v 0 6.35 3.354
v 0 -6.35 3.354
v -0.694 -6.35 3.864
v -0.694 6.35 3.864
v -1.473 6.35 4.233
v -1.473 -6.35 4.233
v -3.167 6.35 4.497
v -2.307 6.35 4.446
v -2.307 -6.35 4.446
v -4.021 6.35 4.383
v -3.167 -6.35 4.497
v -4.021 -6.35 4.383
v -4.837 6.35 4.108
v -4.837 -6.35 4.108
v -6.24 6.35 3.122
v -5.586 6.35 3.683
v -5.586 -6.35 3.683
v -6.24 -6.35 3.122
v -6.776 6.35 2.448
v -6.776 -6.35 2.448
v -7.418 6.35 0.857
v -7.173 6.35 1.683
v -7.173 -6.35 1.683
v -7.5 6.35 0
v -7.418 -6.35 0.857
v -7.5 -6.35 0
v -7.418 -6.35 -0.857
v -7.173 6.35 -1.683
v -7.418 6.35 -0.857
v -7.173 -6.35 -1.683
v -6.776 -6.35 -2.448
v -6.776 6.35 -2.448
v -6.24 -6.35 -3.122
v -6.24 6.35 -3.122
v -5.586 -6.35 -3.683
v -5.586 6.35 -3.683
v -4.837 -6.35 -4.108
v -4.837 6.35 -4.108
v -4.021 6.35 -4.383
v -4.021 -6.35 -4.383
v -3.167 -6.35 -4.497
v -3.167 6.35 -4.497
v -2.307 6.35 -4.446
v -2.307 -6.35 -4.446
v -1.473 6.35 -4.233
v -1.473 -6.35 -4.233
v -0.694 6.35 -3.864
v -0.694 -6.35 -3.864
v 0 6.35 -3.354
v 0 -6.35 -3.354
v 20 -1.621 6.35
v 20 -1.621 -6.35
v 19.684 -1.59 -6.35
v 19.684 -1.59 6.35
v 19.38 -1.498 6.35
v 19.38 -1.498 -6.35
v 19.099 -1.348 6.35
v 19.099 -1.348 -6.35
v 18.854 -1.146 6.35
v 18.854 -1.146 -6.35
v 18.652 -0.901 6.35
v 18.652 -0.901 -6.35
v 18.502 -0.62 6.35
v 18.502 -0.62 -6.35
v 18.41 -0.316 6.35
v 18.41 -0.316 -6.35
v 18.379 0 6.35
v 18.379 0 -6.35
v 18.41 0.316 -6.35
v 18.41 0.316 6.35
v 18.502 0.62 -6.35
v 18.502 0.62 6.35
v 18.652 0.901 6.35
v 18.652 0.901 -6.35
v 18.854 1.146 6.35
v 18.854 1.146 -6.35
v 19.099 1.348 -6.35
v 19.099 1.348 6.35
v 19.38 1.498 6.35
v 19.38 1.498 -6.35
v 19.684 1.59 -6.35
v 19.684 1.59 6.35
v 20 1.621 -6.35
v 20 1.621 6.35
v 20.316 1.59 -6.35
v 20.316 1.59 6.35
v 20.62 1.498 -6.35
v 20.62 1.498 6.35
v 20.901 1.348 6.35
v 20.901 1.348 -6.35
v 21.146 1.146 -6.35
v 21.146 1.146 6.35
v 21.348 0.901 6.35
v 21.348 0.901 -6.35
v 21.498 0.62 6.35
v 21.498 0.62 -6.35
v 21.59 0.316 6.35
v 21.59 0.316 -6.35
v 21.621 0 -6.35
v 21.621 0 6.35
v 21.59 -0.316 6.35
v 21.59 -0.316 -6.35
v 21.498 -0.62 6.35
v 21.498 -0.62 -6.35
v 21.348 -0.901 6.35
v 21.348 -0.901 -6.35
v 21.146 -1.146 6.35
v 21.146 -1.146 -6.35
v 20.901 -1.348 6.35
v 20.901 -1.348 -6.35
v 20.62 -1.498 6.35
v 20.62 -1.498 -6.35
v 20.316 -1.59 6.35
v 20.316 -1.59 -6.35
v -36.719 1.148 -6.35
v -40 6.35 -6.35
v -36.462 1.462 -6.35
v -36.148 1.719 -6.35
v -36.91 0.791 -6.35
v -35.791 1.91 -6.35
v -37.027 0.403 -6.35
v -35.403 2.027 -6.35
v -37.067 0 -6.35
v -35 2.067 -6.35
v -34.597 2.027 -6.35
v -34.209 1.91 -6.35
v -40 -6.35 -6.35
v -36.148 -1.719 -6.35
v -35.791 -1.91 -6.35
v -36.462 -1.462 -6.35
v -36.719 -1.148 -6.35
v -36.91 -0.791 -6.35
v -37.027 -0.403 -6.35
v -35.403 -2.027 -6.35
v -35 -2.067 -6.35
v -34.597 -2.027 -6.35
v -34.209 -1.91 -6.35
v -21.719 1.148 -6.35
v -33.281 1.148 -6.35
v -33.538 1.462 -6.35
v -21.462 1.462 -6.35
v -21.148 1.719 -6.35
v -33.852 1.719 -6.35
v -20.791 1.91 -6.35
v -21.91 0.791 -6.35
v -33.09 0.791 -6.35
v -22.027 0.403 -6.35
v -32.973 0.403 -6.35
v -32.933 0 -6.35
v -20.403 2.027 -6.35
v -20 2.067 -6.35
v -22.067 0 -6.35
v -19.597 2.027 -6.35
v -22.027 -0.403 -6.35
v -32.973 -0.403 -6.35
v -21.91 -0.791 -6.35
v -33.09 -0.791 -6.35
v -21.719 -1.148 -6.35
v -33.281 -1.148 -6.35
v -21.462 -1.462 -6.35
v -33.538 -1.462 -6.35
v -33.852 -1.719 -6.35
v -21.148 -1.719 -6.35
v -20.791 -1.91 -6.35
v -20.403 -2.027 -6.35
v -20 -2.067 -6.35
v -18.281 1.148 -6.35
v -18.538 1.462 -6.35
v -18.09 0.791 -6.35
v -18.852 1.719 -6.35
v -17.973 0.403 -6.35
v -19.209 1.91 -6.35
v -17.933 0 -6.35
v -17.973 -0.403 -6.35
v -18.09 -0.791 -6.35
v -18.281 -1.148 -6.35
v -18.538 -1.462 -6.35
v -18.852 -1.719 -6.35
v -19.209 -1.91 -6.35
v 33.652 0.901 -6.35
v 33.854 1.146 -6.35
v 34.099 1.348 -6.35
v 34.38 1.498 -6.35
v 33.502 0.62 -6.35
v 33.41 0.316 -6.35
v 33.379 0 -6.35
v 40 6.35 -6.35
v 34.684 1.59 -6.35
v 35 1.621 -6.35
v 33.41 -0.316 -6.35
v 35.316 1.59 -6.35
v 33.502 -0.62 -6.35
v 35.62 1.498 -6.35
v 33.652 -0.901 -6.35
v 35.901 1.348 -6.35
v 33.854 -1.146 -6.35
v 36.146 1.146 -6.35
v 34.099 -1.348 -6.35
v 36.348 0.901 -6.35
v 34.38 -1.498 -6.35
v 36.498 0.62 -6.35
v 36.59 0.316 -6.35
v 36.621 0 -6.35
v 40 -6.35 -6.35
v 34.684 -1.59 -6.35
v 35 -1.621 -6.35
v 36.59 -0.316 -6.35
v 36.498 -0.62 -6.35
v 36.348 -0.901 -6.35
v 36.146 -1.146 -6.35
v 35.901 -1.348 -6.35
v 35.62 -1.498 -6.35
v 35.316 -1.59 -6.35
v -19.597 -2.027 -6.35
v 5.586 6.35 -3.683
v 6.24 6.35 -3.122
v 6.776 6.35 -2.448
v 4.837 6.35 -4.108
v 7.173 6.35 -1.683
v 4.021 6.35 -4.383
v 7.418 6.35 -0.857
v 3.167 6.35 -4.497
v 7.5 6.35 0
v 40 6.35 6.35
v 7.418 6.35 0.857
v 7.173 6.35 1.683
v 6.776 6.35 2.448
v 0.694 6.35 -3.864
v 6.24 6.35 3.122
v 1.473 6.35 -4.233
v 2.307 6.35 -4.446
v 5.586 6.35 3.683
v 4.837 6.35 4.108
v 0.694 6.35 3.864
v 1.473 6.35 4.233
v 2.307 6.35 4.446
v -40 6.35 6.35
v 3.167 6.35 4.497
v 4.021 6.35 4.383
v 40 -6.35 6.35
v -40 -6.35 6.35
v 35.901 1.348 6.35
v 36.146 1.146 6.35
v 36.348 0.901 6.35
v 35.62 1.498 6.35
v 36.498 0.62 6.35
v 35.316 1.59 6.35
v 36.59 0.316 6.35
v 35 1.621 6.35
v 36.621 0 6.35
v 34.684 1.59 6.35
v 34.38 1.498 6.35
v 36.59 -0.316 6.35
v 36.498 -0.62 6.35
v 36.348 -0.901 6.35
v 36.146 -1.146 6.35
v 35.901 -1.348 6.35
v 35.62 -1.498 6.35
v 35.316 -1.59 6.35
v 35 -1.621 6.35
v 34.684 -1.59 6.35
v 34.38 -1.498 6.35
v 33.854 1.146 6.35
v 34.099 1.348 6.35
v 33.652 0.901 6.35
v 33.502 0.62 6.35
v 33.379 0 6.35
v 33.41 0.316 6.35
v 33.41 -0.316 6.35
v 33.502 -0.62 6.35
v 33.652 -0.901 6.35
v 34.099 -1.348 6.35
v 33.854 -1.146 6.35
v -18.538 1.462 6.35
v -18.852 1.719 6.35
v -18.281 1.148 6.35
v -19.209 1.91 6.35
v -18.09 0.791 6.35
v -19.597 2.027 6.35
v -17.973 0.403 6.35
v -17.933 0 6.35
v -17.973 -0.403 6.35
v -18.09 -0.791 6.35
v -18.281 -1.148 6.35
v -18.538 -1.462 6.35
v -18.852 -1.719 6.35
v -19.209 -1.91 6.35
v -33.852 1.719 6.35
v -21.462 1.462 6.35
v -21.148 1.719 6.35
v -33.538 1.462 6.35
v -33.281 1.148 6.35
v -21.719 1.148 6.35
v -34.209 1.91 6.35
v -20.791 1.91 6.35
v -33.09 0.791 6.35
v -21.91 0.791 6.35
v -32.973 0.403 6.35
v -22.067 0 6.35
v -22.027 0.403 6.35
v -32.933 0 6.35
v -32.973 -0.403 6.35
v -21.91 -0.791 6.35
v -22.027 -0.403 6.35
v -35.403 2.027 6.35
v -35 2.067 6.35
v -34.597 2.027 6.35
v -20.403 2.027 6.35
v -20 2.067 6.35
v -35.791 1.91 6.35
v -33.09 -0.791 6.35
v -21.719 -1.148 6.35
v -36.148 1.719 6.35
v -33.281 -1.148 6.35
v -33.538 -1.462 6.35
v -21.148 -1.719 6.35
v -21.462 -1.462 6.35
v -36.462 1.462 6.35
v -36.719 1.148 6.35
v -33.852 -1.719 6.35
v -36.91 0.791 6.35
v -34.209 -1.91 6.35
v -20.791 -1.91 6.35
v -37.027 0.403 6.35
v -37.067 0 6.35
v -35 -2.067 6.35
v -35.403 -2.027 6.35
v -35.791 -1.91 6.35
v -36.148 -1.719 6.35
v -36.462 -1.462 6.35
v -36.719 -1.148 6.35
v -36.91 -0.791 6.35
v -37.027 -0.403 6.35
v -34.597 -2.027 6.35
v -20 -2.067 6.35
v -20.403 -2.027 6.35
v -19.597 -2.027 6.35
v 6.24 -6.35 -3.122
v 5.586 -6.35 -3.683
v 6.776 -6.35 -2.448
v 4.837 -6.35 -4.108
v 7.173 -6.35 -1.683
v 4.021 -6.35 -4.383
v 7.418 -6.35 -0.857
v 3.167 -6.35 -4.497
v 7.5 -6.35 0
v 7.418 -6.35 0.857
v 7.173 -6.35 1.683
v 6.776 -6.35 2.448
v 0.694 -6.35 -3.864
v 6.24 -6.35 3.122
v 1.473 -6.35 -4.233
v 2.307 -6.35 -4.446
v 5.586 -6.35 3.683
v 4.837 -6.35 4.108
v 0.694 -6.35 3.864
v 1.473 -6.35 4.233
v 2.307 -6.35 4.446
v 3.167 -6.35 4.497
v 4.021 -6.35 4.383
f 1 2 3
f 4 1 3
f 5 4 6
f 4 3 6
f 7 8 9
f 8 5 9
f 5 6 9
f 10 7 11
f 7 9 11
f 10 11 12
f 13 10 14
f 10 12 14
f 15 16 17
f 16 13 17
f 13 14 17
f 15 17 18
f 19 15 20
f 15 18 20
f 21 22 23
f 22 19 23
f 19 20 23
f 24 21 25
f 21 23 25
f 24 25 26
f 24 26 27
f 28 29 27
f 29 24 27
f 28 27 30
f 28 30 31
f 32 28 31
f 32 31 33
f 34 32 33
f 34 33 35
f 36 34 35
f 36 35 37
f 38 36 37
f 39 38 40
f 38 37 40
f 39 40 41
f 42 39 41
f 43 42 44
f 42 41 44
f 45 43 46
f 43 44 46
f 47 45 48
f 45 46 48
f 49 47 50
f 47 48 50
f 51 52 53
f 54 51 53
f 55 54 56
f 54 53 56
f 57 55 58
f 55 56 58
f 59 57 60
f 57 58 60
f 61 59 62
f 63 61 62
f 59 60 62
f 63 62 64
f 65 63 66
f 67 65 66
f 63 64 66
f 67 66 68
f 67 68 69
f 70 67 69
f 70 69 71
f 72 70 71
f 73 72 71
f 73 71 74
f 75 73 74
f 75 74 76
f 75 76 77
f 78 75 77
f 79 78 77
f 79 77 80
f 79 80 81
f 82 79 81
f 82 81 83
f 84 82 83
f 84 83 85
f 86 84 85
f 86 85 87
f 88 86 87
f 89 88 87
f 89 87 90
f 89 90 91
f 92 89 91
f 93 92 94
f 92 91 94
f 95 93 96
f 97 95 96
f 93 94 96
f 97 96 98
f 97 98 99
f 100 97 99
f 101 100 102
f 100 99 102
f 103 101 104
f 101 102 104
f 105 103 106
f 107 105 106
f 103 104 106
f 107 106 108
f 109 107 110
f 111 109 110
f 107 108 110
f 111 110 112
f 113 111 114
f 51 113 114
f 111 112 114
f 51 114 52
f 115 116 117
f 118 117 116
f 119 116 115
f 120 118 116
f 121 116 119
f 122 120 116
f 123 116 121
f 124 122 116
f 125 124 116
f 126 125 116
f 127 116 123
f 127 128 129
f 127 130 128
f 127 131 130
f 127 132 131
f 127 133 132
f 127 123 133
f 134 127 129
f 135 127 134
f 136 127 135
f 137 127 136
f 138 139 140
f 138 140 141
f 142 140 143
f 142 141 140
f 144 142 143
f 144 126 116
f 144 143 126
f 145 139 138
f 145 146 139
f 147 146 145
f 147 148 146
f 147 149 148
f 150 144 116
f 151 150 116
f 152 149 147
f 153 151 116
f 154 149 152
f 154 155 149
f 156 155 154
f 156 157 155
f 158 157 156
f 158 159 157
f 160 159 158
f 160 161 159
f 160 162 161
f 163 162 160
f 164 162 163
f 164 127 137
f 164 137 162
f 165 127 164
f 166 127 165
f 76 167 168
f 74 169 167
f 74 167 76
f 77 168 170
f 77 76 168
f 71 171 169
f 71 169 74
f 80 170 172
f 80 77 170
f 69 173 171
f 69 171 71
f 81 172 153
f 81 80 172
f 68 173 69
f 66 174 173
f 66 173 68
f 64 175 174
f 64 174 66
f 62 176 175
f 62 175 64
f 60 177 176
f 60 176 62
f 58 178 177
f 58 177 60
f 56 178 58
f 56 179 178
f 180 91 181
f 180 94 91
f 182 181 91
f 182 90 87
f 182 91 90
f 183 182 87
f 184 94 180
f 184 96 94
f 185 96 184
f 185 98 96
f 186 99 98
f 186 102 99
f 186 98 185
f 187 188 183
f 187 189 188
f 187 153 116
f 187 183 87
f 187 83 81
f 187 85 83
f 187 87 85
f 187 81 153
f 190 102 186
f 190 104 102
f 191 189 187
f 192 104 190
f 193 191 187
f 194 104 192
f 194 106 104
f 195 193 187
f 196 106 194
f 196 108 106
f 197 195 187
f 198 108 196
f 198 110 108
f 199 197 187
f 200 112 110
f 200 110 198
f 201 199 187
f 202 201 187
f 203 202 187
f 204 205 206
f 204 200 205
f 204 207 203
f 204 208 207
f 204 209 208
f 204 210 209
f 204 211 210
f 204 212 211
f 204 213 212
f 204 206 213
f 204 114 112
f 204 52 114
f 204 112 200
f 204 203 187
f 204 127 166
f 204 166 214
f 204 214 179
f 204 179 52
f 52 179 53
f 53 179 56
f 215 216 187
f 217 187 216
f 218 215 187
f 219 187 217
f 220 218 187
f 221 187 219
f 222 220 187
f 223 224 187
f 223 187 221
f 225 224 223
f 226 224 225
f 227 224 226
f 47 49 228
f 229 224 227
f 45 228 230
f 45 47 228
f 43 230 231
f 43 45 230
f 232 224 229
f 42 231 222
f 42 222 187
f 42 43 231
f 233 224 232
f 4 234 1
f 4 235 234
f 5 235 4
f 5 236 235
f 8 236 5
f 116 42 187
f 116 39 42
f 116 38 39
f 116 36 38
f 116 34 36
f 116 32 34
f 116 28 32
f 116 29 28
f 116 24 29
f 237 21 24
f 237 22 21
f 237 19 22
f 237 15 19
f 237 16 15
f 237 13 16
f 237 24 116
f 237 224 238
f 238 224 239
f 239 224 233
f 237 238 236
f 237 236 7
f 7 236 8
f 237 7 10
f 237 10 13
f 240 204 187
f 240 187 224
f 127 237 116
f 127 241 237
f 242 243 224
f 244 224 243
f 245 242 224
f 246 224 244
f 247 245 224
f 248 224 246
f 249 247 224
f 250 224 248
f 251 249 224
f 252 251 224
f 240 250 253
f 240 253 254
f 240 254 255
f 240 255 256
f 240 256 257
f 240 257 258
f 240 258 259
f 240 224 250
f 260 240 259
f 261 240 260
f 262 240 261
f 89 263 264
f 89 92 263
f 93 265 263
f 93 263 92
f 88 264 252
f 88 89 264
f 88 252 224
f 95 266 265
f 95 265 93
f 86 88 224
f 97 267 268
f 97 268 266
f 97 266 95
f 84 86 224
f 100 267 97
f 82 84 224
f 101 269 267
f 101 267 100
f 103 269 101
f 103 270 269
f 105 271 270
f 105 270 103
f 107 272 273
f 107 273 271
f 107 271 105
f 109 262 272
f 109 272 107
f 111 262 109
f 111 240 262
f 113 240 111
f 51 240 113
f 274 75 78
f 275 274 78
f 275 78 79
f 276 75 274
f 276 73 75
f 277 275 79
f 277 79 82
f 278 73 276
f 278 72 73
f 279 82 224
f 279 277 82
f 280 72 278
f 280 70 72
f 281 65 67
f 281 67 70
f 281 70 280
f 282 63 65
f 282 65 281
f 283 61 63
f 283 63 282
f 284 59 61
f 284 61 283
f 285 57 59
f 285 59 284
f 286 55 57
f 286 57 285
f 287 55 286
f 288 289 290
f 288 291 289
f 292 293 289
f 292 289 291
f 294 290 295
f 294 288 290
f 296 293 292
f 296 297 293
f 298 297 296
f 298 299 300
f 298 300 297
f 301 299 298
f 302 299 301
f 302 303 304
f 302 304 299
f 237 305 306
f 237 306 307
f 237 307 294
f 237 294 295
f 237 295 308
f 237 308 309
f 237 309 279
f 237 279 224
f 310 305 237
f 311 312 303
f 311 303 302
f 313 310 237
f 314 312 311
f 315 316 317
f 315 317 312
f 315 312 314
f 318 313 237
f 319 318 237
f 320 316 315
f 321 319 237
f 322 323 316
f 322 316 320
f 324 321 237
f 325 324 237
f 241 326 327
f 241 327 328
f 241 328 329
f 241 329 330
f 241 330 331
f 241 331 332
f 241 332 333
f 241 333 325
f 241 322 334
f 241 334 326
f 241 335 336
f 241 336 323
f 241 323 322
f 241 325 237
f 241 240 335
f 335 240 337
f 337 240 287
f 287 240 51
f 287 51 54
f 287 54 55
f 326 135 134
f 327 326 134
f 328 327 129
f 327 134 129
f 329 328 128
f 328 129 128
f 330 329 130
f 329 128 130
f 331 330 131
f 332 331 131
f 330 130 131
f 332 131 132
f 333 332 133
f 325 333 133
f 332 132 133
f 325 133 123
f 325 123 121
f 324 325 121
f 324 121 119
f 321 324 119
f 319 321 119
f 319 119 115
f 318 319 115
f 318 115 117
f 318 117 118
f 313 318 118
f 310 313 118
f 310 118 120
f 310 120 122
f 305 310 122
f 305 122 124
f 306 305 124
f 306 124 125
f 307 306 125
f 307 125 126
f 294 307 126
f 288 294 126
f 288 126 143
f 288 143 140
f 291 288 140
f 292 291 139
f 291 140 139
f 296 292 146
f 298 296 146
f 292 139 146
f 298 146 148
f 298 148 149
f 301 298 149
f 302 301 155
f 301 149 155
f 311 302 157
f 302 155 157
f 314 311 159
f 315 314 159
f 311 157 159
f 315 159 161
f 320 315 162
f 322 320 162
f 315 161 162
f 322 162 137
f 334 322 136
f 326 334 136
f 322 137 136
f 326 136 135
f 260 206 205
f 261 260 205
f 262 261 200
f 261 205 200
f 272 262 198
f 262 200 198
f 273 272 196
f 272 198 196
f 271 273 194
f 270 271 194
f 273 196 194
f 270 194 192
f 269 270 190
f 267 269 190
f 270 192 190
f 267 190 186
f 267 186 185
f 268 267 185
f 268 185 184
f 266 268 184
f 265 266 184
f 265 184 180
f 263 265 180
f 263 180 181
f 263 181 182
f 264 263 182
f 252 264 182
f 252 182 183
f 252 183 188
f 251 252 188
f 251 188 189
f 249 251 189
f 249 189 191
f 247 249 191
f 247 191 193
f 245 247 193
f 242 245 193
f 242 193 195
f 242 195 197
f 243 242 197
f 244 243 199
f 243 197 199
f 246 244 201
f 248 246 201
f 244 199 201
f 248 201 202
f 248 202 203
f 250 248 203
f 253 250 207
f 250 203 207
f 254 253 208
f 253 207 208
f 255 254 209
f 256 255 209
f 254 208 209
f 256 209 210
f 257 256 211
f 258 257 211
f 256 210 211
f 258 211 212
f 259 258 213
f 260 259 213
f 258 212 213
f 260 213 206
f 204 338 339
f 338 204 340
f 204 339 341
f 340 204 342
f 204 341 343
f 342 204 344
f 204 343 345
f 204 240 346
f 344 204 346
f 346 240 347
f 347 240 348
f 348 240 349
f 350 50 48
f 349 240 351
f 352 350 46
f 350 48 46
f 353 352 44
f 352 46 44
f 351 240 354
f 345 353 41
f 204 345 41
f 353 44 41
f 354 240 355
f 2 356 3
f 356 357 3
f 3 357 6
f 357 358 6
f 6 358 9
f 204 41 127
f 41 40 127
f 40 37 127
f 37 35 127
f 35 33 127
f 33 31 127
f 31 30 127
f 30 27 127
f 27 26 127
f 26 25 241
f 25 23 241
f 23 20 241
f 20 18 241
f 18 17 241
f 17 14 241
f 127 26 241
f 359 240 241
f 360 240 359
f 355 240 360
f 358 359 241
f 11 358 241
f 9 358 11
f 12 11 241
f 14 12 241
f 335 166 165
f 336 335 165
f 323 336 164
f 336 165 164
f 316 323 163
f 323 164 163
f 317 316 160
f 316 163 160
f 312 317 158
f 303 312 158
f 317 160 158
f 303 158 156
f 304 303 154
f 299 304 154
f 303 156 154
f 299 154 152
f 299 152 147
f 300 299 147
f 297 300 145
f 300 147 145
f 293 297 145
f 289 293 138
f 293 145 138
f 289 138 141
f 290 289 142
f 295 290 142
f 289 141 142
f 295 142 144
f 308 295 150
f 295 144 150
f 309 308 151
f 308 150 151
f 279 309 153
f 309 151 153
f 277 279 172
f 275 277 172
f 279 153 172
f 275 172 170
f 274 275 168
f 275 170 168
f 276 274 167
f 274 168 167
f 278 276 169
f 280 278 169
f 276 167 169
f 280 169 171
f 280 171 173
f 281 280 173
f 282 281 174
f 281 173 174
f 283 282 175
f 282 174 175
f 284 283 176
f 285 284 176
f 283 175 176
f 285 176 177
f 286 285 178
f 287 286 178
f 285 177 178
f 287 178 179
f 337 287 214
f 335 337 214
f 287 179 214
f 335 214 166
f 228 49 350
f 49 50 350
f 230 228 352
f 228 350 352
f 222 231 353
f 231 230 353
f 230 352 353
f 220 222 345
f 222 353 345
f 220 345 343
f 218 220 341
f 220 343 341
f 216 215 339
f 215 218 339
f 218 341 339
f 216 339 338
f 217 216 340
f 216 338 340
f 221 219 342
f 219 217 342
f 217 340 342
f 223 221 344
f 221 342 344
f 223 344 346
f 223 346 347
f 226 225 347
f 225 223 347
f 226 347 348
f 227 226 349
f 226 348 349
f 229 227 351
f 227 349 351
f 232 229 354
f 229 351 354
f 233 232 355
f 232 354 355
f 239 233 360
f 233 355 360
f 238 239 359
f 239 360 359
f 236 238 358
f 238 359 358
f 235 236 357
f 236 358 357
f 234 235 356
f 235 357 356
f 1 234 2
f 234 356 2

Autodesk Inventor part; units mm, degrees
ref_plane "YZ Plane" through (0, 0, 0) normal (1, 0, 0) x (0, 1, 0)
ref_plane "XZ Plane" through (0, 0, 0) normal (0, 1, 0) x (-1, 0, 0)
ref_plane "XY Plane" through (0, 0, 0) normal (0, 0, 1) x (1, 0, 0)
sketch "スケッチ1" plane through (0, 0, 0) normal (0, 1, 0) x (-1, 0, 0)
  line L0 (-40, 6.35) -> (40, 6.35)
  line L1 (40, 6.35) -> (40, -6.35)
  line L2 (40, -6.35) -> (-40, -6.35)
  line L3 (-40, -6.35) -> (-40, 6.35)
  line L4 (-40, 6.35) -> (40, -6.35) construction
  line L5 (40, 6.35) -> (-40, -6.35) construction
  arc A0 (0, 3.3541) -> (0, -3.3541) centre (-3, 0) ccw
  line L6 (-40, 0) -> (0, 0) construction
  line L7 (0, 6.35) -> (0, -6.35) construction
  arc A1 (0, -3.3541) -> (0, 3.3541) centre (3, 0) ccw
  point P0 (0, -3.3541)
  dimension "d0" = 80
  dimension "d1" = 12.7
  dimension "d2" = 9
  dimension "d3" = 3
extrude "押し出し1" add sketch "スケッチ1" along normal mid plane 12.7
sketch "スケッチ2" plane through (-40, 6.35, 6.35) normal (0, 0, 1) x (1, 0, 0)
  line L0 (80, -12.7) -> (80, 0) projected
  line L1 (80, -6.35) -> (0, -6.35) construction
  line L2 (0, -12.7) -> (0, 0) projected
  line L3 (80, 0) -> (0, 0) projected
  line L4 (40, 0) -> (40, -12.7) construction
  line L5 (80, -12.7) -> (0, -12.7) projected
  point P0 (40, -6.35)
  point P1 (75, -6.35)
  point P2 (60, -6.35)
  point P3 (20, -6.35)
  point P4 (5, -6.35)
  dimension "d6" = 15
  dimension "d7" = 15
  dimension "d8" = 40
hole "穴1" at (35, 0, 6.35) at (20, 0, 6.35) direction (0, 0, -1) diameter 3.242 end through all thread size "M4x0.7" class "6H" standard "ISO Metric profile"
hole "穴2" at (-20, 0, 6.35) at (-35, 0, 6.35) direction (0, 0, -1) diameter 4.134 end through all thread size "M5x0.8" class "6H" standard "ISO Metric profile"
properties part number "SC133-20kg"
